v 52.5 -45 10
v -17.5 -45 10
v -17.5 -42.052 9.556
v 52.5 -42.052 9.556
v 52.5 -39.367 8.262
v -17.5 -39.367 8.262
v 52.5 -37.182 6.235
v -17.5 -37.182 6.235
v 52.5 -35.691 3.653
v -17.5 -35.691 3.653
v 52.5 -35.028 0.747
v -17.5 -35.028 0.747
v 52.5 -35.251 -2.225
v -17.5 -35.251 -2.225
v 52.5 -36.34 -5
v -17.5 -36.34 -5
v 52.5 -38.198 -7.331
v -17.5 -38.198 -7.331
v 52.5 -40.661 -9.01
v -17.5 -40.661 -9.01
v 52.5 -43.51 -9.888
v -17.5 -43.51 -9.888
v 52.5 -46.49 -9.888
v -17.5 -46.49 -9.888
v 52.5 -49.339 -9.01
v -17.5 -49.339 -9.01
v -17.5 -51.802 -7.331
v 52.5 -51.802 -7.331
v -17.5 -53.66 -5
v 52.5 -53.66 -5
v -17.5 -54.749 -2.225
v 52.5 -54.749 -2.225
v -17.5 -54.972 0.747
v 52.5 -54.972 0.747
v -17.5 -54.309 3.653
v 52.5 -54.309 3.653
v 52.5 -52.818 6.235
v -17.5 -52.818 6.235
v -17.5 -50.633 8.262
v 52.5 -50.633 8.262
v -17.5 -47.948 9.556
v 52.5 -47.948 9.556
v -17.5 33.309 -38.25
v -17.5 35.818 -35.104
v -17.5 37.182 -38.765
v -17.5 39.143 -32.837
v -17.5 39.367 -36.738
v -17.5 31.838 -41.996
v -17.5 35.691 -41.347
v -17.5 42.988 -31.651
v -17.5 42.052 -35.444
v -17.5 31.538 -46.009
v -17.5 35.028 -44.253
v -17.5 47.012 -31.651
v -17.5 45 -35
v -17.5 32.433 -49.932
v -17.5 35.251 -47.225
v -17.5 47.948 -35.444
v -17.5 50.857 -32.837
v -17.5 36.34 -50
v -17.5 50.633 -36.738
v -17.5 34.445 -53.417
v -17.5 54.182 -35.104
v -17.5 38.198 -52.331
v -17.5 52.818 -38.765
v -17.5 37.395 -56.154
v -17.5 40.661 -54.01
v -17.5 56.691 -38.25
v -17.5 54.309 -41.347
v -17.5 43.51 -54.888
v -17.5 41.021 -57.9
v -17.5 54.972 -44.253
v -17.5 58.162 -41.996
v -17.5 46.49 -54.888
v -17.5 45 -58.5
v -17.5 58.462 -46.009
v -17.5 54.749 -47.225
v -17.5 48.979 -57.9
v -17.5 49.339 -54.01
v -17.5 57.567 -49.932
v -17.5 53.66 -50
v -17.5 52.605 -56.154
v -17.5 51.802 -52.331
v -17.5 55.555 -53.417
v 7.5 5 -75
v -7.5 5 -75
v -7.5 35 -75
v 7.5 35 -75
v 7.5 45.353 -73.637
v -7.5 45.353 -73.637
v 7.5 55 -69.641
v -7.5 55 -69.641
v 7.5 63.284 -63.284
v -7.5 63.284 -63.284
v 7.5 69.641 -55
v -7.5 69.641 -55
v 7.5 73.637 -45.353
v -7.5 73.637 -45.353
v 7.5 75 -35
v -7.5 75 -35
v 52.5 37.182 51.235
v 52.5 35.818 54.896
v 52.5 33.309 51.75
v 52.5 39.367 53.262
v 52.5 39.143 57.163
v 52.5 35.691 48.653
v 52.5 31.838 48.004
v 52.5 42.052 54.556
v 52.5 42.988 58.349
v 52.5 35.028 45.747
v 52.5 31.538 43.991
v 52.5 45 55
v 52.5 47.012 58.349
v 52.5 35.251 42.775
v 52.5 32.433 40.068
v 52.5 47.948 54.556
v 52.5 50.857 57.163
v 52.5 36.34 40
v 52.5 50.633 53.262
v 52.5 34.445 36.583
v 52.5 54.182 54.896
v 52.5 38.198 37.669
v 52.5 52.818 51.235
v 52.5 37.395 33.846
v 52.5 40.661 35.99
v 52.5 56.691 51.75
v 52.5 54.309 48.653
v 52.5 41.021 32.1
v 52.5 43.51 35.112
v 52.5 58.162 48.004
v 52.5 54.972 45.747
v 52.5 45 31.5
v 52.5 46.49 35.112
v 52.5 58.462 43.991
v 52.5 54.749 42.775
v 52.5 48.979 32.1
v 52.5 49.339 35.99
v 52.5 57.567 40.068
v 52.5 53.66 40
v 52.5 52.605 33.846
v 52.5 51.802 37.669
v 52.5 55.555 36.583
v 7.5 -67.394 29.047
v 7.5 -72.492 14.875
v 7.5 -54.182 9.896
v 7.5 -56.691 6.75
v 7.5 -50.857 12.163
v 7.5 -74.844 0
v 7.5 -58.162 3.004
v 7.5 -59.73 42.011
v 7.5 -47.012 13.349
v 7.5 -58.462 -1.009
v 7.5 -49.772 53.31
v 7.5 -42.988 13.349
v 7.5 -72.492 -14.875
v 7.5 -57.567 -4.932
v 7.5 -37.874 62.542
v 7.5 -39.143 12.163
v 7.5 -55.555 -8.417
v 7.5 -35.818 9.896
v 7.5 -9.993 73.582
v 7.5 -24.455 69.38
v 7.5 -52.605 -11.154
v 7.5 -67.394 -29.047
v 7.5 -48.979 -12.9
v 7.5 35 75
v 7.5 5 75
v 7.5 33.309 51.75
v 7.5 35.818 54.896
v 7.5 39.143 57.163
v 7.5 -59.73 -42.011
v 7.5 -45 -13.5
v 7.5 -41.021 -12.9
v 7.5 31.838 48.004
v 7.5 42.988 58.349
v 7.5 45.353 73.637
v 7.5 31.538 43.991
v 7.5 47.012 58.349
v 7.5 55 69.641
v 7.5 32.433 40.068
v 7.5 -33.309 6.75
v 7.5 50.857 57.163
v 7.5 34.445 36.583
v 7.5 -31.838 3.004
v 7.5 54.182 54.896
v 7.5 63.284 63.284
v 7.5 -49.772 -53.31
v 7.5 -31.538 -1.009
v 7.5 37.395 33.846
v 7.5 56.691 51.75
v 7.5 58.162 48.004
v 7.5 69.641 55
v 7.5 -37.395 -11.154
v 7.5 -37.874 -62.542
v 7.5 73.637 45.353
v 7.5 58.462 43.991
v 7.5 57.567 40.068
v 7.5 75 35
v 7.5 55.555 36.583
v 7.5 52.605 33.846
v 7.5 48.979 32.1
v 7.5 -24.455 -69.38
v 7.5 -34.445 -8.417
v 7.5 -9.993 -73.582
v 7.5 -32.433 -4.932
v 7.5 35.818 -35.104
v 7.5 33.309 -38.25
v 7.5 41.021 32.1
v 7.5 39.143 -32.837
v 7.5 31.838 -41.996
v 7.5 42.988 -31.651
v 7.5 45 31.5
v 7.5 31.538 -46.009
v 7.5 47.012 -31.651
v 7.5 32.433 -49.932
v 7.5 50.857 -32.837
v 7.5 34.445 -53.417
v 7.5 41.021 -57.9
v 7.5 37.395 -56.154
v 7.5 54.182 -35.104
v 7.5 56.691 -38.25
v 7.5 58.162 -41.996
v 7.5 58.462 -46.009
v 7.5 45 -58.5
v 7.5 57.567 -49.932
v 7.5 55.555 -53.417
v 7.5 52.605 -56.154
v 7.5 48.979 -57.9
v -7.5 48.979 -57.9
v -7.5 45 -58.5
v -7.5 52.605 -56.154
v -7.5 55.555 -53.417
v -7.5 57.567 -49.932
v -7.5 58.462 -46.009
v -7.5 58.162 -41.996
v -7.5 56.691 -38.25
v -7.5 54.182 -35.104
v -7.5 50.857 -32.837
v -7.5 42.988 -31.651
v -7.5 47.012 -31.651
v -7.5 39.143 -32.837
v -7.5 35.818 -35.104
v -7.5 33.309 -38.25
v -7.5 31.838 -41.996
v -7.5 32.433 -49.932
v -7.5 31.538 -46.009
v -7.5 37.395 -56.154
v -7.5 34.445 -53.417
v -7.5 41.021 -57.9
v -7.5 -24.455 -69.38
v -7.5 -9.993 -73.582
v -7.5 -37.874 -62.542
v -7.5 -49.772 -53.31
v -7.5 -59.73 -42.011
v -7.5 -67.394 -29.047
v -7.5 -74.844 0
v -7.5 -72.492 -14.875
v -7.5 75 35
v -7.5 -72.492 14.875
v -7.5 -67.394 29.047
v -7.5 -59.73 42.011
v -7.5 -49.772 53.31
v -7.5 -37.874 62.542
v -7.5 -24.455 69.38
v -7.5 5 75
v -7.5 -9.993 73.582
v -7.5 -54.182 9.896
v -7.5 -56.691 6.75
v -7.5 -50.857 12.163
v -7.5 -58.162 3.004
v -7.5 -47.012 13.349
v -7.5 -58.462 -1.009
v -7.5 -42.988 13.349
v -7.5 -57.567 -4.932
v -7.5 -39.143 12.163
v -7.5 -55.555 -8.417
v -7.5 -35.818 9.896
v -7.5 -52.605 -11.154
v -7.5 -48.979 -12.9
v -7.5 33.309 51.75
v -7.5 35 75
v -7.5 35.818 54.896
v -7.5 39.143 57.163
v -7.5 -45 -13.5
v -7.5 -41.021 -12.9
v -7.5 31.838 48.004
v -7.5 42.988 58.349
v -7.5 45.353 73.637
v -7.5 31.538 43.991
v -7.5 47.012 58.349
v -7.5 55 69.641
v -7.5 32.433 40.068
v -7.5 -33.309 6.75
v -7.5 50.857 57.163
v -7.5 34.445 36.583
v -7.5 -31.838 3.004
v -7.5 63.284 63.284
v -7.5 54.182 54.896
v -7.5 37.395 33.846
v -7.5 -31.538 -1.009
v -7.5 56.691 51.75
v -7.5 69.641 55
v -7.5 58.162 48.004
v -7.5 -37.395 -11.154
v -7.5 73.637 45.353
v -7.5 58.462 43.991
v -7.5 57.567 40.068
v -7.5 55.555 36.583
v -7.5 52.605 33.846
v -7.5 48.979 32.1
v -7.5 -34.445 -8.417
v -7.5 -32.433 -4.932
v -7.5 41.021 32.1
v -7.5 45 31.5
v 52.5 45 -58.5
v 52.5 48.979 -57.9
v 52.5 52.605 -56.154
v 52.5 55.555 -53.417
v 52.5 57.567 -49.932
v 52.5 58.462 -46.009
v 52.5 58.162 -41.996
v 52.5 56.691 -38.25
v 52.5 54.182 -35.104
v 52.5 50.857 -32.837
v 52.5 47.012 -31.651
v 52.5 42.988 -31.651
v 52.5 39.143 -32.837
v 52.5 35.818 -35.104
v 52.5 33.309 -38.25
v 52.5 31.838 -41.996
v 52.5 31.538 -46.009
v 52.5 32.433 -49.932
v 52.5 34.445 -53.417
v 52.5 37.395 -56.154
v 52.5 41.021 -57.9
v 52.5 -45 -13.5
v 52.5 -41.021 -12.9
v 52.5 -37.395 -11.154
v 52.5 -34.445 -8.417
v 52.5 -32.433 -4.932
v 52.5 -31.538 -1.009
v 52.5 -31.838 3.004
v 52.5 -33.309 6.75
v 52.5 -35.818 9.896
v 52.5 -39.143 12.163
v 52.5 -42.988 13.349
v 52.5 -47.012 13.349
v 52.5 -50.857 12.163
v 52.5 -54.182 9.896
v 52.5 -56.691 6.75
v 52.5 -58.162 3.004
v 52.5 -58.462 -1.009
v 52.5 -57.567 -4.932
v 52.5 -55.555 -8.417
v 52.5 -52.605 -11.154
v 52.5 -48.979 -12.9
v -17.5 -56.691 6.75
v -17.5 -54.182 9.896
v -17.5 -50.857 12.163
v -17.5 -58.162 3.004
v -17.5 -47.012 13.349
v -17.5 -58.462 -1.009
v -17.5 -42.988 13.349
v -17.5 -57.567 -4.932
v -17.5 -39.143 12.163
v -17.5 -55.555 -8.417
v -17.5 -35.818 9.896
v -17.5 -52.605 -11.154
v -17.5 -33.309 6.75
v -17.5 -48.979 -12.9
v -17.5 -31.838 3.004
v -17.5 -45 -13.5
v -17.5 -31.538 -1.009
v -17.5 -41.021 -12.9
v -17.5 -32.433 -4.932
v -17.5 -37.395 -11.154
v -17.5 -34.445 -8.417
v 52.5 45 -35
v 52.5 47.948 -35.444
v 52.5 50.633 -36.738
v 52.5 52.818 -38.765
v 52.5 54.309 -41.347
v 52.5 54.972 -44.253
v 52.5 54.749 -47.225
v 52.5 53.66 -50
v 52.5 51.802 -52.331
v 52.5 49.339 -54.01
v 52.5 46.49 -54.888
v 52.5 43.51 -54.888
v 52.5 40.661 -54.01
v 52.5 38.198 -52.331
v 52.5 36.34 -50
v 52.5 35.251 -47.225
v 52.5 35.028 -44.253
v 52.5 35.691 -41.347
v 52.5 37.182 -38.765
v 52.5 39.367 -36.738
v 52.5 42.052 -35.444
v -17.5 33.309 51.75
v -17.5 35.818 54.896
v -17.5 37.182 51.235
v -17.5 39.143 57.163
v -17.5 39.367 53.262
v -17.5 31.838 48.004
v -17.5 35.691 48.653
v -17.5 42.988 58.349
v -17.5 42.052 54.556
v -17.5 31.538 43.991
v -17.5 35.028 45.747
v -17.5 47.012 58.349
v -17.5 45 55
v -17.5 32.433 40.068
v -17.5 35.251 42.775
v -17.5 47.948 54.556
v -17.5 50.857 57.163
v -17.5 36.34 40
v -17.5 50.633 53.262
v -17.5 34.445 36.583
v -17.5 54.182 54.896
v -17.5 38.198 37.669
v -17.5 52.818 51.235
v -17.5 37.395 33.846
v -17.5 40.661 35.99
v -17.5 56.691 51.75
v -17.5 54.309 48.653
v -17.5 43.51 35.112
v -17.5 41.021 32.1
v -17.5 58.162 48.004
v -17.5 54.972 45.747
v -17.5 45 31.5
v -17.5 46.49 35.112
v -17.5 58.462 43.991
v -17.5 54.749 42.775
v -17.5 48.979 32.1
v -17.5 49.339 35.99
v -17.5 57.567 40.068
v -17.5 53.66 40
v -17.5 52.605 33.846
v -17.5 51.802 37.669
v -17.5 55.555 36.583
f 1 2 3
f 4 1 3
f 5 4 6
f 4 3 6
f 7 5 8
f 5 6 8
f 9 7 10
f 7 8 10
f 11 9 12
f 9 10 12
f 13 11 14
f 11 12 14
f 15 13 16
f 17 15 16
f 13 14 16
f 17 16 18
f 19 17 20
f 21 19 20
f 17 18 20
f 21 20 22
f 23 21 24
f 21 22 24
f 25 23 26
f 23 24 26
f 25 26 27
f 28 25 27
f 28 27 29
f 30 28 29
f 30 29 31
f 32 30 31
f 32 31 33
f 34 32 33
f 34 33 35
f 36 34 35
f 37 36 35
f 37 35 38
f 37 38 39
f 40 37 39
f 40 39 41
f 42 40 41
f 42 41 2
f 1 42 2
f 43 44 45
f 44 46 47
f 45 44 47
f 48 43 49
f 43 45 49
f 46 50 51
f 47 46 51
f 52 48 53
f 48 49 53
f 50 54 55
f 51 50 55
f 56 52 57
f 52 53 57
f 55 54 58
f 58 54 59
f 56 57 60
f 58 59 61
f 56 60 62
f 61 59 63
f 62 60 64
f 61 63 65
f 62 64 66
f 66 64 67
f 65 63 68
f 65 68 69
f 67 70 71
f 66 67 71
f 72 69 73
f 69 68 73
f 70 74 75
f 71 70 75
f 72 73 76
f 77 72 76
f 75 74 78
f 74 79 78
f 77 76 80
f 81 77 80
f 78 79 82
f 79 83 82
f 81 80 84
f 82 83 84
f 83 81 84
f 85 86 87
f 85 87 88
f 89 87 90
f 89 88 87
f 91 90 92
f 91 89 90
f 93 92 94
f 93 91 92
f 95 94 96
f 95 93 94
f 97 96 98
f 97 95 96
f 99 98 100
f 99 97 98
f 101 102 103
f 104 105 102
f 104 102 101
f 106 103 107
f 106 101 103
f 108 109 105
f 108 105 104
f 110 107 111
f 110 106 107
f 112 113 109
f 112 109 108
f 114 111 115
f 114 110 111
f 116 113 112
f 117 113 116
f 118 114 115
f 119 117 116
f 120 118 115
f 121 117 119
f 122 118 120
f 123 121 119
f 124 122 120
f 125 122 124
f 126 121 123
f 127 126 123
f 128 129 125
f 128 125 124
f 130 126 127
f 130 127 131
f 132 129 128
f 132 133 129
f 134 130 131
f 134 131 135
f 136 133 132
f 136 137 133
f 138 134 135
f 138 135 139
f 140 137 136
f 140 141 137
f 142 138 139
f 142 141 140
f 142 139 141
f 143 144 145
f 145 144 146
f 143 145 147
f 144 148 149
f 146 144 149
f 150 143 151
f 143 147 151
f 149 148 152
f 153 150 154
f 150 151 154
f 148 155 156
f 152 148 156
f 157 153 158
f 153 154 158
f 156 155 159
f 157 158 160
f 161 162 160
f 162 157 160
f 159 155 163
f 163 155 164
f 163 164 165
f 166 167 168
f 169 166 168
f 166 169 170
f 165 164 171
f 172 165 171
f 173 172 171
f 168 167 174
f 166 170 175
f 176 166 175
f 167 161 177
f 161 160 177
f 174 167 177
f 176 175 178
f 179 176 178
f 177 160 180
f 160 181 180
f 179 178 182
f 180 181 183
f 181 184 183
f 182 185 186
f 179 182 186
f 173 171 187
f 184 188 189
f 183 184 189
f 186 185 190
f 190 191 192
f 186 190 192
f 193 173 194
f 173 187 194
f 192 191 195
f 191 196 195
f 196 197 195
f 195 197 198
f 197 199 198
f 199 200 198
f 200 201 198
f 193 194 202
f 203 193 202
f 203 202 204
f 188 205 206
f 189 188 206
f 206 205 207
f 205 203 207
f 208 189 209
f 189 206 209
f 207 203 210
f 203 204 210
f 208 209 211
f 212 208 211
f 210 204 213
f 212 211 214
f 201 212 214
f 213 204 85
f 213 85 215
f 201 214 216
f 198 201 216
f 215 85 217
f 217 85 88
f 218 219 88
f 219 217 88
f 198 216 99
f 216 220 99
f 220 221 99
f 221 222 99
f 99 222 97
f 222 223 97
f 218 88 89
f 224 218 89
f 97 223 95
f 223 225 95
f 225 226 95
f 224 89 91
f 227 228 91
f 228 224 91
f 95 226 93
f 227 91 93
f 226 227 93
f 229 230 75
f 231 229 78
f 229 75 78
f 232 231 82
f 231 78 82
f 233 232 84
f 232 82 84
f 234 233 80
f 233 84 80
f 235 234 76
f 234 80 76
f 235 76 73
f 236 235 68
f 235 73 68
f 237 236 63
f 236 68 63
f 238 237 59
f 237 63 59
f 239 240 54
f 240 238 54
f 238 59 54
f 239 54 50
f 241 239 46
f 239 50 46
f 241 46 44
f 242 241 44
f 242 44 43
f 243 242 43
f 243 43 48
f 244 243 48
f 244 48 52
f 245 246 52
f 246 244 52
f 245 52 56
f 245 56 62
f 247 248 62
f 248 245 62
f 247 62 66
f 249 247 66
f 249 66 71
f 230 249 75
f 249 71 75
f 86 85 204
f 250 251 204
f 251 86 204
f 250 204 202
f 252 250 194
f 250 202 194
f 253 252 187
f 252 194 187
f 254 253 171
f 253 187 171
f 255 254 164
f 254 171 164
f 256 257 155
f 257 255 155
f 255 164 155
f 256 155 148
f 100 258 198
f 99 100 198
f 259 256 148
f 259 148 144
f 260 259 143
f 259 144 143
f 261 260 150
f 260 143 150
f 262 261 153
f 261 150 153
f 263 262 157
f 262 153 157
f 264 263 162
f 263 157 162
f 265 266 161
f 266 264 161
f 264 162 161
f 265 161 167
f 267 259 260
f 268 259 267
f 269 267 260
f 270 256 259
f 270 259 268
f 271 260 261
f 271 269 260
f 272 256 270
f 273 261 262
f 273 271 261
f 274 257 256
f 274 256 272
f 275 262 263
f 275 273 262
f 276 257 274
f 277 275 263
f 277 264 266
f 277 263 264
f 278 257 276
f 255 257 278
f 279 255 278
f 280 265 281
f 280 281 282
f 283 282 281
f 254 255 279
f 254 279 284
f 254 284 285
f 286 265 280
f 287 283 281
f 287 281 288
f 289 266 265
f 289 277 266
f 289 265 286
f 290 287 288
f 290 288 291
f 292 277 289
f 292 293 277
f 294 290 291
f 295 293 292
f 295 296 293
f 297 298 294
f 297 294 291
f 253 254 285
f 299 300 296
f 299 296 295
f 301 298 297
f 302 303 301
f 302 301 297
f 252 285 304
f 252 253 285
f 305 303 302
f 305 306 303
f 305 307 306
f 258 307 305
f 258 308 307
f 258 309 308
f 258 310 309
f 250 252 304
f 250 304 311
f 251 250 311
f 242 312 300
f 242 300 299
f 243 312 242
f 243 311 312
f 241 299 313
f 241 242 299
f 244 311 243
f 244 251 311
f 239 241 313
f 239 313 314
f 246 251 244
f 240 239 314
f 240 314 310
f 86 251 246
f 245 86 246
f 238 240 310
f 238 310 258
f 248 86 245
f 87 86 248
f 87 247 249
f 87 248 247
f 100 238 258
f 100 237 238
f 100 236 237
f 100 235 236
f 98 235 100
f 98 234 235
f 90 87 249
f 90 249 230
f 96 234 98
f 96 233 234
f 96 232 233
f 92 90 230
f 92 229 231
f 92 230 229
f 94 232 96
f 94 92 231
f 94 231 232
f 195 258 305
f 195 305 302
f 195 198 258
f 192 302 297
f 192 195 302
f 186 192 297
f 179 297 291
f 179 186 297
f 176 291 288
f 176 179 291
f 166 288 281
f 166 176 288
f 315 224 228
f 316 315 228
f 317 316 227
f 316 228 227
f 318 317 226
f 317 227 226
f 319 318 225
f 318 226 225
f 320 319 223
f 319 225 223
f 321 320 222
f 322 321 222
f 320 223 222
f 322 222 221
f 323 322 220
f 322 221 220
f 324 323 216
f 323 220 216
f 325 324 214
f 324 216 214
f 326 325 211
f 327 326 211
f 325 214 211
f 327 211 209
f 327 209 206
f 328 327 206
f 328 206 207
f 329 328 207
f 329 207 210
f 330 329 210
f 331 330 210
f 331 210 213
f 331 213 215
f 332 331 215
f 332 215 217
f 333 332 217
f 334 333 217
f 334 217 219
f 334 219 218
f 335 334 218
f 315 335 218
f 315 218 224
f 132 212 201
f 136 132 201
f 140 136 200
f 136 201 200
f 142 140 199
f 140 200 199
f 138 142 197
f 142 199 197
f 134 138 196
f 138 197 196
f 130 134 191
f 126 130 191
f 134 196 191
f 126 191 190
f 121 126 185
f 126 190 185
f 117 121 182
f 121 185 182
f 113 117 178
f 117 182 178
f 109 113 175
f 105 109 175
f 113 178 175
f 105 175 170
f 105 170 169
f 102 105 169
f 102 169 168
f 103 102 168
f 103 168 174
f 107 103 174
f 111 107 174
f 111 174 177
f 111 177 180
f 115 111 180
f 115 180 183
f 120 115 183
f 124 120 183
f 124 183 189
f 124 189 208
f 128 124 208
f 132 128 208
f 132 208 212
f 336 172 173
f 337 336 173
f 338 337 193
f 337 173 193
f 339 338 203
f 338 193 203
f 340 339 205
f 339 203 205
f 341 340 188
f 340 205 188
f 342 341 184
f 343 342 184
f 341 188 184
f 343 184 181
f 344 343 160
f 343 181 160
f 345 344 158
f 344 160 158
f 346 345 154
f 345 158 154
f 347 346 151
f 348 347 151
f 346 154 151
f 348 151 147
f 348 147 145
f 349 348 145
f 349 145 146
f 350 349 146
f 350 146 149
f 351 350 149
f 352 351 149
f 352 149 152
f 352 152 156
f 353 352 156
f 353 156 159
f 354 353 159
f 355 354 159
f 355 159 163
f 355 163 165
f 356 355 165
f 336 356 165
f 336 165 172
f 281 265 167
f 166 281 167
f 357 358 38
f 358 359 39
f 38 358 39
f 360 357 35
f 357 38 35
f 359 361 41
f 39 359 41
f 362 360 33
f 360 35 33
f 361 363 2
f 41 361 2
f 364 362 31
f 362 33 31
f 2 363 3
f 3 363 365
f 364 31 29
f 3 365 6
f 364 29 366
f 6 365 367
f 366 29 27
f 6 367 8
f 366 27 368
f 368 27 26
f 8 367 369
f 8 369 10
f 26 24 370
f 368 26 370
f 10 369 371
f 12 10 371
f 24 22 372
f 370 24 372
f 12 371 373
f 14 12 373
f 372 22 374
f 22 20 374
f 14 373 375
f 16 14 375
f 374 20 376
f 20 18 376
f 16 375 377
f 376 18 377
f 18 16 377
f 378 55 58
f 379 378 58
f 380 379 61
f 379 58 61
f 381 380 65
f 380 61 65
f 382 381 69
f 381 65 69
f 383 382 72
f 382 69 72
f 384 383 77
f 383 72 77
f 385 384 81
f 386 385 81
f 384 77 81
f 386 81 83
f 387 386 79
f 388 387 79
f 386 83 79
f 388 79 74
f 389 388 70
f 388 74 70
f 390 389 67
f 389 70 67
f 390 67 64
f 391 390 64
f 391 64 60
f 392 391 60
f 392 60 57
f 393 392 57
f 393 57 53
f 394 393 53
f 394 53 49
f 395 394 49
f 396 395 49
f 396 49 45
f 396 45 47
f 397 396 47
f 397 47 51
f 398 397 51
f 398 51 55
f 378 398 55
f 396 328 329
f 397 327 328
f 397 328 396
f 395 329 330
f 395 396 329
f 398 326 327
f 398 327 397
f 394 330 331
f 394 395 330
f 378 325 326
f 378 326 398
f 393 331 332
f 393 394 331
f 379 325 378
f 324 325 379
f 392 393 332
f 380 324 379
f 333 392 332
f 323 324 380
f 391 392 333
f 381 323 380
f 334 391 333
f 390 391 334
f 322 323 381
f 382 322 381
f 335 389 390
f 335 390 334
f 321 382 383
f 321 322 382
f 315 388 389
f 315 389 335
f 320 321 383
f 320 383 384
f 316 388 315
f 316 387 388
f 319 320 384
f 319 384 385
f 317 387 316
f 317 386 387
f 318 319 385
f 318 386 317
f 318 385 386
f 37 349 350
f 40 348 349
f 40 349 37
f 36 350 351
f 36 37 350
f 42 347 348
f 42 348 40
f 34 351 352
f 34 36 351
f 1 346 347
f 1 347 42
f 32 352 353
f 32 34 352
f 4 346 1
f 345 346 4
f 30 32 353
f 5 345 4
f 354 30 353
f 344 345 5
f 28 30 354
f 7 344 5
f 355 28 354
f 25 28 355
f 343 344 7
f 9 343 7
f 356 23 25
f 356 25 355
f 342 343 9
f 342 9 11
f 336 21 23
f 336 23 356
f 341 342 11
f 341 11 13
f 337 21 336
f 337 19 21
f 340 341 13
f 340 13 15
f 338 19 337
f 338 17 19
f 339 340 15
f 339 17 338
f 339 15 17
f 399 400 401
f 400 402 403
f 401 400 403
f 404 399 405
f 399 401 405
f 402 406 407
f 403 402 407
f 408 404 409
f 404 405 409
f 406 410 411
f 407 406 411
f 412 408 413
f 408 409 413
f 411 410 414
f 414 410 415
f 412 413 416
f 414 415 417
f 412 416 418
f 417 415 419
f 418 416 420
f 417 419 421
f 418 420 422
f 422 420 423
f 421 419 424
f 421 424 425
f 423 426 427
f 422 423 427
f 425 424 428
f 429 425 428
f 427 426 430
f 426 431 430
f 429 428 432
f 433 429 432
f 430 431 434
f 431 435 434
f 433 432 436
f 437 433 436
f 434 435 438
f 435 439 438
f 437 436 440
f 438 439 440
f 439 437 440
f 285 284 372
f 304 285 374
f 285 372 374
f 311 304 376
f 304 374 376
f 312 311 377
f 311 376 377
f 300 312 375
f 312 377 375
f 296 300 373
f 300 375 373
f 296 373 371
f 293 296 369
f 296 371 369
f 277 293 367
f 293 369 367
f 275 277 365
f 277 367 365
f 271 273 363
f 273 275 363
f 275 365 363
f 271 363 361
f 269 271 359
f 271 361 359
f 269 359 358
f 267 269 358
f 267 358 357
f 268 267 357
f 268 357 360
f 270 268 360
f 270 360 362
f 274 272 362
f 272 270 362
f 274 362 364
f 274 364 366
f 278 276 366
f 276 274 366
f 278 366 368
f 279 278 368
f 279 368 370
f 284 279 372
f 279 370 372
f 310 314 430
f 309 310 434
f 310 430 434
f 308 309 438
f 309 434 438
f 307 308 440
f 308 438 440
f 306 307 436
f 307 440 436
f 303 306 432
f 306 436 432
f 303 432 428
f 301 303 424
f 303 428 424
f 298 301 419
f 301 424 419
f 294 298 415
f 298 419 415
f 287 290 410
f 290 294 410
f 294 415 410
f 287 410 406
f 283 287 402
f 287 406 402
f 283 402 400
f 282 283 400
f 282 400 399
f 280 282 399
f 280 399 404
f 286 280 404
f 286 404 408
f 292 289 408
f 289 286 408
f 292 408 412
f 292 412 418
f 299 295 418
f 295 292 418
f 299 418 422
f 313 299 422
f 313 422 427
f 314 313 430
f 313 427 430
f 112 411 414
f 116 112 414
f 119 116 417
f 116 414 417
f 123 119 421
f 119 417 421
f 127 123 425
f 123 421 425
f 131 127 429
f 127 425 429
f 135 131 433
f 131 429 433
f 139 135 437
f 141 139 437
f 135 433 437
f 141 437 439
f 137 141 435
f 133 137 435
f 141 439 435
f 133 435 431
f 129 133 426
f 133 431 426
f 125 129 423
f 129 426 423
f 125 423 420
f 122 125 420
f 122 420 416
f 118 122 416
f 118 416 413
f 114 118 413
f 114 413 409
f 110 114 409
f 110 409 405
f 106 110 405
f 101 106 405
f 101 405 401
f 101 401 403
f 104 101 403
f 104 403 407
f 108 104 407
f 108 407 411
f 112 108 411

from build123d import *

# Parameters (mm, degrees)
BOSS_EXTRUDE1_DEPTH      = 75
BOSS_EXTRUDE1_DEPTH_BACK = 75
SKETCH1_W                = 15
SKETCH1_H                = 150
BOSS_EXTRUDE2_DEPTH      = 45
BOSS_EXTRUDE2_DEPTH_BACK = 25
SKETCH2_R                = 13.5
F_20_0MM_DOWEL_HOLE1_D   = 20
FILLET2_R                = 80
FILLET3_R                = 40


with BuildPart() as part:
    # Sketch1 → Boss-Extrude1 (new, two sides: drawn at the far end of the back side and taken through both)
    with BuildSketch(Plane.XY.offset(-BOSS_EXTRUDE1_DEPTH_BACK)):
        Rectangle(SKETCH1_W, SKETCH1_H)
    extrude(amount=BOSS_EXTRUDE1_DEPTH + BOSS_EXTRUDE1_DEPTH_BACK)

    # Sketch2 → Boss-Extrude2 (add, two sides: drawn at the far end of the back side and taken through both)
    with BuildSketch(Plane(origin=(7.5, 0, 0), x_dir=(0, 0, -1), z_dir=(1, 0, 0)).offset(-BOSS_EXTRUDE2_DEPTH_BACK)):
        with Locations((0, -45)):
            Circle(SKETCH2_R)
        with Locations((-45, 45)):
            Circle(SKETCH2_R)
        with Locations((45, 45)):
            Circle(SKETCH2_R)
    extrude(amount=BOSS_EXTRUDE2_DEPTH + BOSS_EXTRUDE2_DEPTH_BACK)

    # Ø20.0mm Dowel Hole1 (through all)
    with Locations(Plane(origin=(52.5, 0, 0), x_dir=(0, 0, -1), z_dir=(1, 0, 0))):
        with Locations((-45, 45), (45, 45), (0, -45)):
            Hole(F_20_0MM_DOWEL_HOLE1_D / 2)

    # Fillet2
    # the kernel refuses this fillet: 80 mm, written as the material it takes off along each edge
    with BuildSketch(Plane(origin=(207.5, -75, -75), x_dir=(0, 0, 1), z_dir=(-1, 0, 0))) as fillet2_piece_1:
        with BuildLine():
            CenterArc((FILLET2_R, FILLET2_R), FILLET2_R, 180, 90)
            Line((0, FILLET2_R), (0, 0))
            Line((0, 0), (FILLET2_R, 0))
        make_face()
    extrude(amount=415, mode=Mode.SUBTRACT)
    with BuildSketch(Plane(origin=(207.5, -75, 75), x_dir=(0, 0, -1), z_dir=(-1, 0, 0))) as fillet2_piece_2:
        with BuildLine():
            CenterArc((FILLET2_R, -FILLET2_R), FILLET2_R, 90, 90)
            Line((0, -FILLET2_R), (0, 0))
            Line((0, 0), (FILLET2_R, 0))
        make_face()
    extrude(amount=415, mode=Mode.SUBTRACT)

    # Fillet3
    fillet3_edges = [part.edges().sort_by_distance(p)[0] for p in [
        (0, 75, 75),
        (0, 75, -75),
    ]]
    fillet(fillet3_edges, radius=FILLET3_R)


solid = part.part
